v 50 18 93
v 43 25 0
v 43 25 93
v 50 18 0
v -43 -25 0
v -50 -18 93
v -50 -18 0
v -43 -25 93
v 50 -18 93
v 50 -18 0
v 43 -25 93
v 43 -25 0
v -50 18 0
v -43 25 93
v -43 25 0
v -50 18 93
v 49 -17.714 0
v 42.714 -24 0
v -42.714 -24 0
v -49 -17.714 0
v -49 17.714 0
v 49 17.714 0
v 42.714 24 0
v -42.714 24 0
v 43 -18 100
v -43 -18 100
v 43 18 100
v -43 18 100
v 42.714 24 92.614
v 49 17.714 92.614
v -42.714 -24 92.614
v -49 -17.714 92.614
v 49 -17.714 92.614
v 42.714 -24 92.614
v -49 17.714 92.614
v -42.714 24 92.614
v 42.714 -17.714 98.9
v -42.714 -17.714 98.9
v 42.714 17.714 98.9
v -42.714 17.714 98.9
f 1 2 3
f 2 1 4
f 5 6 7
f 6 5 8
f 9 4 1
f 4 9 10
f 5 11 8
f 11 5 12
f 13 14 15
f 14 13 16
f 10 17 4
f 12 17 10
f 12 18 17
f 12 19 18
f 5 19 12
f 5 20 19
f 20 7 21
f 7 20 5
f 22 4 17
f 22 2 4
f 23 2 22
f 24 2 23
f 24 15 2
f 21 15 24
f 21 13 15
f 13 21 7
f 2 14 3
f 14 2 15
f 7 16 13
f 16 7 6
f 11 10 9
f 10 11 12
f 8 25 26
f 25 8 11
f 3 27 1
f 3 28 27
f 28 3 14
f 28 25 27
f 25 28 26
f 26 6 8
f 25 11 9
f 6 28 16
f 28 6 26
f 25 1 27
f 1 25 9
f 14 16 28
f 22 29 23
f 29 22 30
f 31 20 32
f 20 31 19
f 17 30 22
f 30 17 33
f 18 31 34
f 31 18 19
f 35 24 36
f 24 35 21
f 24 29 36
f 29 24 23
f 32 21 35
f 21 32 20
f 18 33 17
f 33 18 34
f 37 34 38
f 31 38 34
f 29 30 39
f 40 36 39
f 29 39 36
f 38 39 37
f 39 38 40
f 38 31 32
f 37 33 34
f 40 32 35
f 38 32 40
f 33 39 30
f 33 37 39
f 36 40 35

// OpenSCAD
boxDims=[100,50,100];
chamfer=7;
wallThck=1;

/* [hidden] */
fudge=0.1;

chamfBox();

module chamfBox(){
  //inner chamfer from wallthck
  chmfIn=sqrt(2)*(sqrt(2)*chamfer/2-wallThck);
  echo(chmfIn);
  difference(){
    chamfCube(boxDims,chamfer);
    translate([0,0,-fudge]) chamfCube([boxDims.x-wallThck*2,boxDims.y-wallThck*2,boxDims.z-wallThck],chmfIn+0.7);
  }
}

module chamfCube(size=[10,10,10], chamferSize=1){
  echo(size);
  //create top with chamfer
  linear_extrude(size.z-chamferSize) chamferedRect([size.x,size.y],chamferSize);
  
  hull() for (ix=[-1,1], iy=[-1,1]){
    //determine rotation of the corner piece
    crnRot= (ix<0 && iy<0) ? 180 :
            (ix<0 && iy>0) ? 90 :
            (ix>0 && iy<0) ? -90 :
            0;
    translate([ix*(size.x/2-chamferSize),iy*(size.y/2-chamferSize),size.z-chamferSize]) 
      rotate(crnRot) corner(size=chamferSize);
  } 
}

module corner(size=[10,10,10]){
  dims = is_list(size) ? size : [size,size,size];
  points = [[0,0,0], [0,dims.y,0], [dims.x,0,0], [0,0,dims.z]];
  polyhedron(points, [[0,2,1], [0,1,3], [1,2,3], [0,3,2]]);
}

module chamferedRect(size=[10,10],chamferSize=1){
  
  //counterclockwise
  poly=[[-size.x/2+chamferSize,-size.y/2],[-size.x/2,-size.y/2+chamferSize], //bottom left
        [-size.x/2, size.y/2-chamferSize],[-size.x/2+chamferSize, size.y/2], //top left
        [ size.x/2-chamferSize, size.y/2],[ size.x/2, size.y/2-chamferSize], //top rigth
        [ size.x/2,-size.y/2+chamferSize],[ size.x/2-chamferSize,-size.y/2], //bottom rigth
       ];
  polygon(poly);
}
